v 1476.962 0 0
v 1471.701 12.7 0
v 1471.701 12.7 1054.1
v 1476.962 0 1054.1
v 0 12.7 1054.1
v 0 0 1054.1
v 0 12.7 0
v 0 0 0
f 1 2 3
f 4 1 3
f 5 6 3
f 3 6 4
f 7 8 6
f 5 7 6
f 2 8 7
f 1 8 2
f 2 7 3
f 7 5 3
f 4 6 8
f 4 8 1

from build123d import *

# Parameters (mm, degrees)
F0_W     = 1476.9619122421
F0_H     = 1054.1
F1_DEPTH = 12.7
F2_SIZE2 = 5.260502
F2_SIZE  = 12.69999


# Not quite as in the source:
# - a fillet or chamfer is up to 0.001 mm smaller than in the source, because OpenCascade refuses the exact size


with BuildPart() as f1:
    # F0 (on Front) → F1 (new body)
    with BuildSketch(Plane.XZ):
        with Locations((738.4809561211, 527.05)):
            Rectangle(F0_W, F0_H)
    extrude(amount=-F1_DEPTH)

    # F2 (size 12.7 and 5.2605122421 in the source; OpenCascade refuses exactly that, so slightly less here)
    f2_edges = [f1.edges().sort_by_distance(p)[0] for p in [
        (1476.961912, 12.7, 527.05),
    ]]
    f2_side = f1.faces().sort_by_distance((1476.961912, 6.35, 527.05))[0]
    chamfer(f2_edges, length=F2_SIZE, length2=F2_SIZE2, reference=f2_side)


solid = f1.part
